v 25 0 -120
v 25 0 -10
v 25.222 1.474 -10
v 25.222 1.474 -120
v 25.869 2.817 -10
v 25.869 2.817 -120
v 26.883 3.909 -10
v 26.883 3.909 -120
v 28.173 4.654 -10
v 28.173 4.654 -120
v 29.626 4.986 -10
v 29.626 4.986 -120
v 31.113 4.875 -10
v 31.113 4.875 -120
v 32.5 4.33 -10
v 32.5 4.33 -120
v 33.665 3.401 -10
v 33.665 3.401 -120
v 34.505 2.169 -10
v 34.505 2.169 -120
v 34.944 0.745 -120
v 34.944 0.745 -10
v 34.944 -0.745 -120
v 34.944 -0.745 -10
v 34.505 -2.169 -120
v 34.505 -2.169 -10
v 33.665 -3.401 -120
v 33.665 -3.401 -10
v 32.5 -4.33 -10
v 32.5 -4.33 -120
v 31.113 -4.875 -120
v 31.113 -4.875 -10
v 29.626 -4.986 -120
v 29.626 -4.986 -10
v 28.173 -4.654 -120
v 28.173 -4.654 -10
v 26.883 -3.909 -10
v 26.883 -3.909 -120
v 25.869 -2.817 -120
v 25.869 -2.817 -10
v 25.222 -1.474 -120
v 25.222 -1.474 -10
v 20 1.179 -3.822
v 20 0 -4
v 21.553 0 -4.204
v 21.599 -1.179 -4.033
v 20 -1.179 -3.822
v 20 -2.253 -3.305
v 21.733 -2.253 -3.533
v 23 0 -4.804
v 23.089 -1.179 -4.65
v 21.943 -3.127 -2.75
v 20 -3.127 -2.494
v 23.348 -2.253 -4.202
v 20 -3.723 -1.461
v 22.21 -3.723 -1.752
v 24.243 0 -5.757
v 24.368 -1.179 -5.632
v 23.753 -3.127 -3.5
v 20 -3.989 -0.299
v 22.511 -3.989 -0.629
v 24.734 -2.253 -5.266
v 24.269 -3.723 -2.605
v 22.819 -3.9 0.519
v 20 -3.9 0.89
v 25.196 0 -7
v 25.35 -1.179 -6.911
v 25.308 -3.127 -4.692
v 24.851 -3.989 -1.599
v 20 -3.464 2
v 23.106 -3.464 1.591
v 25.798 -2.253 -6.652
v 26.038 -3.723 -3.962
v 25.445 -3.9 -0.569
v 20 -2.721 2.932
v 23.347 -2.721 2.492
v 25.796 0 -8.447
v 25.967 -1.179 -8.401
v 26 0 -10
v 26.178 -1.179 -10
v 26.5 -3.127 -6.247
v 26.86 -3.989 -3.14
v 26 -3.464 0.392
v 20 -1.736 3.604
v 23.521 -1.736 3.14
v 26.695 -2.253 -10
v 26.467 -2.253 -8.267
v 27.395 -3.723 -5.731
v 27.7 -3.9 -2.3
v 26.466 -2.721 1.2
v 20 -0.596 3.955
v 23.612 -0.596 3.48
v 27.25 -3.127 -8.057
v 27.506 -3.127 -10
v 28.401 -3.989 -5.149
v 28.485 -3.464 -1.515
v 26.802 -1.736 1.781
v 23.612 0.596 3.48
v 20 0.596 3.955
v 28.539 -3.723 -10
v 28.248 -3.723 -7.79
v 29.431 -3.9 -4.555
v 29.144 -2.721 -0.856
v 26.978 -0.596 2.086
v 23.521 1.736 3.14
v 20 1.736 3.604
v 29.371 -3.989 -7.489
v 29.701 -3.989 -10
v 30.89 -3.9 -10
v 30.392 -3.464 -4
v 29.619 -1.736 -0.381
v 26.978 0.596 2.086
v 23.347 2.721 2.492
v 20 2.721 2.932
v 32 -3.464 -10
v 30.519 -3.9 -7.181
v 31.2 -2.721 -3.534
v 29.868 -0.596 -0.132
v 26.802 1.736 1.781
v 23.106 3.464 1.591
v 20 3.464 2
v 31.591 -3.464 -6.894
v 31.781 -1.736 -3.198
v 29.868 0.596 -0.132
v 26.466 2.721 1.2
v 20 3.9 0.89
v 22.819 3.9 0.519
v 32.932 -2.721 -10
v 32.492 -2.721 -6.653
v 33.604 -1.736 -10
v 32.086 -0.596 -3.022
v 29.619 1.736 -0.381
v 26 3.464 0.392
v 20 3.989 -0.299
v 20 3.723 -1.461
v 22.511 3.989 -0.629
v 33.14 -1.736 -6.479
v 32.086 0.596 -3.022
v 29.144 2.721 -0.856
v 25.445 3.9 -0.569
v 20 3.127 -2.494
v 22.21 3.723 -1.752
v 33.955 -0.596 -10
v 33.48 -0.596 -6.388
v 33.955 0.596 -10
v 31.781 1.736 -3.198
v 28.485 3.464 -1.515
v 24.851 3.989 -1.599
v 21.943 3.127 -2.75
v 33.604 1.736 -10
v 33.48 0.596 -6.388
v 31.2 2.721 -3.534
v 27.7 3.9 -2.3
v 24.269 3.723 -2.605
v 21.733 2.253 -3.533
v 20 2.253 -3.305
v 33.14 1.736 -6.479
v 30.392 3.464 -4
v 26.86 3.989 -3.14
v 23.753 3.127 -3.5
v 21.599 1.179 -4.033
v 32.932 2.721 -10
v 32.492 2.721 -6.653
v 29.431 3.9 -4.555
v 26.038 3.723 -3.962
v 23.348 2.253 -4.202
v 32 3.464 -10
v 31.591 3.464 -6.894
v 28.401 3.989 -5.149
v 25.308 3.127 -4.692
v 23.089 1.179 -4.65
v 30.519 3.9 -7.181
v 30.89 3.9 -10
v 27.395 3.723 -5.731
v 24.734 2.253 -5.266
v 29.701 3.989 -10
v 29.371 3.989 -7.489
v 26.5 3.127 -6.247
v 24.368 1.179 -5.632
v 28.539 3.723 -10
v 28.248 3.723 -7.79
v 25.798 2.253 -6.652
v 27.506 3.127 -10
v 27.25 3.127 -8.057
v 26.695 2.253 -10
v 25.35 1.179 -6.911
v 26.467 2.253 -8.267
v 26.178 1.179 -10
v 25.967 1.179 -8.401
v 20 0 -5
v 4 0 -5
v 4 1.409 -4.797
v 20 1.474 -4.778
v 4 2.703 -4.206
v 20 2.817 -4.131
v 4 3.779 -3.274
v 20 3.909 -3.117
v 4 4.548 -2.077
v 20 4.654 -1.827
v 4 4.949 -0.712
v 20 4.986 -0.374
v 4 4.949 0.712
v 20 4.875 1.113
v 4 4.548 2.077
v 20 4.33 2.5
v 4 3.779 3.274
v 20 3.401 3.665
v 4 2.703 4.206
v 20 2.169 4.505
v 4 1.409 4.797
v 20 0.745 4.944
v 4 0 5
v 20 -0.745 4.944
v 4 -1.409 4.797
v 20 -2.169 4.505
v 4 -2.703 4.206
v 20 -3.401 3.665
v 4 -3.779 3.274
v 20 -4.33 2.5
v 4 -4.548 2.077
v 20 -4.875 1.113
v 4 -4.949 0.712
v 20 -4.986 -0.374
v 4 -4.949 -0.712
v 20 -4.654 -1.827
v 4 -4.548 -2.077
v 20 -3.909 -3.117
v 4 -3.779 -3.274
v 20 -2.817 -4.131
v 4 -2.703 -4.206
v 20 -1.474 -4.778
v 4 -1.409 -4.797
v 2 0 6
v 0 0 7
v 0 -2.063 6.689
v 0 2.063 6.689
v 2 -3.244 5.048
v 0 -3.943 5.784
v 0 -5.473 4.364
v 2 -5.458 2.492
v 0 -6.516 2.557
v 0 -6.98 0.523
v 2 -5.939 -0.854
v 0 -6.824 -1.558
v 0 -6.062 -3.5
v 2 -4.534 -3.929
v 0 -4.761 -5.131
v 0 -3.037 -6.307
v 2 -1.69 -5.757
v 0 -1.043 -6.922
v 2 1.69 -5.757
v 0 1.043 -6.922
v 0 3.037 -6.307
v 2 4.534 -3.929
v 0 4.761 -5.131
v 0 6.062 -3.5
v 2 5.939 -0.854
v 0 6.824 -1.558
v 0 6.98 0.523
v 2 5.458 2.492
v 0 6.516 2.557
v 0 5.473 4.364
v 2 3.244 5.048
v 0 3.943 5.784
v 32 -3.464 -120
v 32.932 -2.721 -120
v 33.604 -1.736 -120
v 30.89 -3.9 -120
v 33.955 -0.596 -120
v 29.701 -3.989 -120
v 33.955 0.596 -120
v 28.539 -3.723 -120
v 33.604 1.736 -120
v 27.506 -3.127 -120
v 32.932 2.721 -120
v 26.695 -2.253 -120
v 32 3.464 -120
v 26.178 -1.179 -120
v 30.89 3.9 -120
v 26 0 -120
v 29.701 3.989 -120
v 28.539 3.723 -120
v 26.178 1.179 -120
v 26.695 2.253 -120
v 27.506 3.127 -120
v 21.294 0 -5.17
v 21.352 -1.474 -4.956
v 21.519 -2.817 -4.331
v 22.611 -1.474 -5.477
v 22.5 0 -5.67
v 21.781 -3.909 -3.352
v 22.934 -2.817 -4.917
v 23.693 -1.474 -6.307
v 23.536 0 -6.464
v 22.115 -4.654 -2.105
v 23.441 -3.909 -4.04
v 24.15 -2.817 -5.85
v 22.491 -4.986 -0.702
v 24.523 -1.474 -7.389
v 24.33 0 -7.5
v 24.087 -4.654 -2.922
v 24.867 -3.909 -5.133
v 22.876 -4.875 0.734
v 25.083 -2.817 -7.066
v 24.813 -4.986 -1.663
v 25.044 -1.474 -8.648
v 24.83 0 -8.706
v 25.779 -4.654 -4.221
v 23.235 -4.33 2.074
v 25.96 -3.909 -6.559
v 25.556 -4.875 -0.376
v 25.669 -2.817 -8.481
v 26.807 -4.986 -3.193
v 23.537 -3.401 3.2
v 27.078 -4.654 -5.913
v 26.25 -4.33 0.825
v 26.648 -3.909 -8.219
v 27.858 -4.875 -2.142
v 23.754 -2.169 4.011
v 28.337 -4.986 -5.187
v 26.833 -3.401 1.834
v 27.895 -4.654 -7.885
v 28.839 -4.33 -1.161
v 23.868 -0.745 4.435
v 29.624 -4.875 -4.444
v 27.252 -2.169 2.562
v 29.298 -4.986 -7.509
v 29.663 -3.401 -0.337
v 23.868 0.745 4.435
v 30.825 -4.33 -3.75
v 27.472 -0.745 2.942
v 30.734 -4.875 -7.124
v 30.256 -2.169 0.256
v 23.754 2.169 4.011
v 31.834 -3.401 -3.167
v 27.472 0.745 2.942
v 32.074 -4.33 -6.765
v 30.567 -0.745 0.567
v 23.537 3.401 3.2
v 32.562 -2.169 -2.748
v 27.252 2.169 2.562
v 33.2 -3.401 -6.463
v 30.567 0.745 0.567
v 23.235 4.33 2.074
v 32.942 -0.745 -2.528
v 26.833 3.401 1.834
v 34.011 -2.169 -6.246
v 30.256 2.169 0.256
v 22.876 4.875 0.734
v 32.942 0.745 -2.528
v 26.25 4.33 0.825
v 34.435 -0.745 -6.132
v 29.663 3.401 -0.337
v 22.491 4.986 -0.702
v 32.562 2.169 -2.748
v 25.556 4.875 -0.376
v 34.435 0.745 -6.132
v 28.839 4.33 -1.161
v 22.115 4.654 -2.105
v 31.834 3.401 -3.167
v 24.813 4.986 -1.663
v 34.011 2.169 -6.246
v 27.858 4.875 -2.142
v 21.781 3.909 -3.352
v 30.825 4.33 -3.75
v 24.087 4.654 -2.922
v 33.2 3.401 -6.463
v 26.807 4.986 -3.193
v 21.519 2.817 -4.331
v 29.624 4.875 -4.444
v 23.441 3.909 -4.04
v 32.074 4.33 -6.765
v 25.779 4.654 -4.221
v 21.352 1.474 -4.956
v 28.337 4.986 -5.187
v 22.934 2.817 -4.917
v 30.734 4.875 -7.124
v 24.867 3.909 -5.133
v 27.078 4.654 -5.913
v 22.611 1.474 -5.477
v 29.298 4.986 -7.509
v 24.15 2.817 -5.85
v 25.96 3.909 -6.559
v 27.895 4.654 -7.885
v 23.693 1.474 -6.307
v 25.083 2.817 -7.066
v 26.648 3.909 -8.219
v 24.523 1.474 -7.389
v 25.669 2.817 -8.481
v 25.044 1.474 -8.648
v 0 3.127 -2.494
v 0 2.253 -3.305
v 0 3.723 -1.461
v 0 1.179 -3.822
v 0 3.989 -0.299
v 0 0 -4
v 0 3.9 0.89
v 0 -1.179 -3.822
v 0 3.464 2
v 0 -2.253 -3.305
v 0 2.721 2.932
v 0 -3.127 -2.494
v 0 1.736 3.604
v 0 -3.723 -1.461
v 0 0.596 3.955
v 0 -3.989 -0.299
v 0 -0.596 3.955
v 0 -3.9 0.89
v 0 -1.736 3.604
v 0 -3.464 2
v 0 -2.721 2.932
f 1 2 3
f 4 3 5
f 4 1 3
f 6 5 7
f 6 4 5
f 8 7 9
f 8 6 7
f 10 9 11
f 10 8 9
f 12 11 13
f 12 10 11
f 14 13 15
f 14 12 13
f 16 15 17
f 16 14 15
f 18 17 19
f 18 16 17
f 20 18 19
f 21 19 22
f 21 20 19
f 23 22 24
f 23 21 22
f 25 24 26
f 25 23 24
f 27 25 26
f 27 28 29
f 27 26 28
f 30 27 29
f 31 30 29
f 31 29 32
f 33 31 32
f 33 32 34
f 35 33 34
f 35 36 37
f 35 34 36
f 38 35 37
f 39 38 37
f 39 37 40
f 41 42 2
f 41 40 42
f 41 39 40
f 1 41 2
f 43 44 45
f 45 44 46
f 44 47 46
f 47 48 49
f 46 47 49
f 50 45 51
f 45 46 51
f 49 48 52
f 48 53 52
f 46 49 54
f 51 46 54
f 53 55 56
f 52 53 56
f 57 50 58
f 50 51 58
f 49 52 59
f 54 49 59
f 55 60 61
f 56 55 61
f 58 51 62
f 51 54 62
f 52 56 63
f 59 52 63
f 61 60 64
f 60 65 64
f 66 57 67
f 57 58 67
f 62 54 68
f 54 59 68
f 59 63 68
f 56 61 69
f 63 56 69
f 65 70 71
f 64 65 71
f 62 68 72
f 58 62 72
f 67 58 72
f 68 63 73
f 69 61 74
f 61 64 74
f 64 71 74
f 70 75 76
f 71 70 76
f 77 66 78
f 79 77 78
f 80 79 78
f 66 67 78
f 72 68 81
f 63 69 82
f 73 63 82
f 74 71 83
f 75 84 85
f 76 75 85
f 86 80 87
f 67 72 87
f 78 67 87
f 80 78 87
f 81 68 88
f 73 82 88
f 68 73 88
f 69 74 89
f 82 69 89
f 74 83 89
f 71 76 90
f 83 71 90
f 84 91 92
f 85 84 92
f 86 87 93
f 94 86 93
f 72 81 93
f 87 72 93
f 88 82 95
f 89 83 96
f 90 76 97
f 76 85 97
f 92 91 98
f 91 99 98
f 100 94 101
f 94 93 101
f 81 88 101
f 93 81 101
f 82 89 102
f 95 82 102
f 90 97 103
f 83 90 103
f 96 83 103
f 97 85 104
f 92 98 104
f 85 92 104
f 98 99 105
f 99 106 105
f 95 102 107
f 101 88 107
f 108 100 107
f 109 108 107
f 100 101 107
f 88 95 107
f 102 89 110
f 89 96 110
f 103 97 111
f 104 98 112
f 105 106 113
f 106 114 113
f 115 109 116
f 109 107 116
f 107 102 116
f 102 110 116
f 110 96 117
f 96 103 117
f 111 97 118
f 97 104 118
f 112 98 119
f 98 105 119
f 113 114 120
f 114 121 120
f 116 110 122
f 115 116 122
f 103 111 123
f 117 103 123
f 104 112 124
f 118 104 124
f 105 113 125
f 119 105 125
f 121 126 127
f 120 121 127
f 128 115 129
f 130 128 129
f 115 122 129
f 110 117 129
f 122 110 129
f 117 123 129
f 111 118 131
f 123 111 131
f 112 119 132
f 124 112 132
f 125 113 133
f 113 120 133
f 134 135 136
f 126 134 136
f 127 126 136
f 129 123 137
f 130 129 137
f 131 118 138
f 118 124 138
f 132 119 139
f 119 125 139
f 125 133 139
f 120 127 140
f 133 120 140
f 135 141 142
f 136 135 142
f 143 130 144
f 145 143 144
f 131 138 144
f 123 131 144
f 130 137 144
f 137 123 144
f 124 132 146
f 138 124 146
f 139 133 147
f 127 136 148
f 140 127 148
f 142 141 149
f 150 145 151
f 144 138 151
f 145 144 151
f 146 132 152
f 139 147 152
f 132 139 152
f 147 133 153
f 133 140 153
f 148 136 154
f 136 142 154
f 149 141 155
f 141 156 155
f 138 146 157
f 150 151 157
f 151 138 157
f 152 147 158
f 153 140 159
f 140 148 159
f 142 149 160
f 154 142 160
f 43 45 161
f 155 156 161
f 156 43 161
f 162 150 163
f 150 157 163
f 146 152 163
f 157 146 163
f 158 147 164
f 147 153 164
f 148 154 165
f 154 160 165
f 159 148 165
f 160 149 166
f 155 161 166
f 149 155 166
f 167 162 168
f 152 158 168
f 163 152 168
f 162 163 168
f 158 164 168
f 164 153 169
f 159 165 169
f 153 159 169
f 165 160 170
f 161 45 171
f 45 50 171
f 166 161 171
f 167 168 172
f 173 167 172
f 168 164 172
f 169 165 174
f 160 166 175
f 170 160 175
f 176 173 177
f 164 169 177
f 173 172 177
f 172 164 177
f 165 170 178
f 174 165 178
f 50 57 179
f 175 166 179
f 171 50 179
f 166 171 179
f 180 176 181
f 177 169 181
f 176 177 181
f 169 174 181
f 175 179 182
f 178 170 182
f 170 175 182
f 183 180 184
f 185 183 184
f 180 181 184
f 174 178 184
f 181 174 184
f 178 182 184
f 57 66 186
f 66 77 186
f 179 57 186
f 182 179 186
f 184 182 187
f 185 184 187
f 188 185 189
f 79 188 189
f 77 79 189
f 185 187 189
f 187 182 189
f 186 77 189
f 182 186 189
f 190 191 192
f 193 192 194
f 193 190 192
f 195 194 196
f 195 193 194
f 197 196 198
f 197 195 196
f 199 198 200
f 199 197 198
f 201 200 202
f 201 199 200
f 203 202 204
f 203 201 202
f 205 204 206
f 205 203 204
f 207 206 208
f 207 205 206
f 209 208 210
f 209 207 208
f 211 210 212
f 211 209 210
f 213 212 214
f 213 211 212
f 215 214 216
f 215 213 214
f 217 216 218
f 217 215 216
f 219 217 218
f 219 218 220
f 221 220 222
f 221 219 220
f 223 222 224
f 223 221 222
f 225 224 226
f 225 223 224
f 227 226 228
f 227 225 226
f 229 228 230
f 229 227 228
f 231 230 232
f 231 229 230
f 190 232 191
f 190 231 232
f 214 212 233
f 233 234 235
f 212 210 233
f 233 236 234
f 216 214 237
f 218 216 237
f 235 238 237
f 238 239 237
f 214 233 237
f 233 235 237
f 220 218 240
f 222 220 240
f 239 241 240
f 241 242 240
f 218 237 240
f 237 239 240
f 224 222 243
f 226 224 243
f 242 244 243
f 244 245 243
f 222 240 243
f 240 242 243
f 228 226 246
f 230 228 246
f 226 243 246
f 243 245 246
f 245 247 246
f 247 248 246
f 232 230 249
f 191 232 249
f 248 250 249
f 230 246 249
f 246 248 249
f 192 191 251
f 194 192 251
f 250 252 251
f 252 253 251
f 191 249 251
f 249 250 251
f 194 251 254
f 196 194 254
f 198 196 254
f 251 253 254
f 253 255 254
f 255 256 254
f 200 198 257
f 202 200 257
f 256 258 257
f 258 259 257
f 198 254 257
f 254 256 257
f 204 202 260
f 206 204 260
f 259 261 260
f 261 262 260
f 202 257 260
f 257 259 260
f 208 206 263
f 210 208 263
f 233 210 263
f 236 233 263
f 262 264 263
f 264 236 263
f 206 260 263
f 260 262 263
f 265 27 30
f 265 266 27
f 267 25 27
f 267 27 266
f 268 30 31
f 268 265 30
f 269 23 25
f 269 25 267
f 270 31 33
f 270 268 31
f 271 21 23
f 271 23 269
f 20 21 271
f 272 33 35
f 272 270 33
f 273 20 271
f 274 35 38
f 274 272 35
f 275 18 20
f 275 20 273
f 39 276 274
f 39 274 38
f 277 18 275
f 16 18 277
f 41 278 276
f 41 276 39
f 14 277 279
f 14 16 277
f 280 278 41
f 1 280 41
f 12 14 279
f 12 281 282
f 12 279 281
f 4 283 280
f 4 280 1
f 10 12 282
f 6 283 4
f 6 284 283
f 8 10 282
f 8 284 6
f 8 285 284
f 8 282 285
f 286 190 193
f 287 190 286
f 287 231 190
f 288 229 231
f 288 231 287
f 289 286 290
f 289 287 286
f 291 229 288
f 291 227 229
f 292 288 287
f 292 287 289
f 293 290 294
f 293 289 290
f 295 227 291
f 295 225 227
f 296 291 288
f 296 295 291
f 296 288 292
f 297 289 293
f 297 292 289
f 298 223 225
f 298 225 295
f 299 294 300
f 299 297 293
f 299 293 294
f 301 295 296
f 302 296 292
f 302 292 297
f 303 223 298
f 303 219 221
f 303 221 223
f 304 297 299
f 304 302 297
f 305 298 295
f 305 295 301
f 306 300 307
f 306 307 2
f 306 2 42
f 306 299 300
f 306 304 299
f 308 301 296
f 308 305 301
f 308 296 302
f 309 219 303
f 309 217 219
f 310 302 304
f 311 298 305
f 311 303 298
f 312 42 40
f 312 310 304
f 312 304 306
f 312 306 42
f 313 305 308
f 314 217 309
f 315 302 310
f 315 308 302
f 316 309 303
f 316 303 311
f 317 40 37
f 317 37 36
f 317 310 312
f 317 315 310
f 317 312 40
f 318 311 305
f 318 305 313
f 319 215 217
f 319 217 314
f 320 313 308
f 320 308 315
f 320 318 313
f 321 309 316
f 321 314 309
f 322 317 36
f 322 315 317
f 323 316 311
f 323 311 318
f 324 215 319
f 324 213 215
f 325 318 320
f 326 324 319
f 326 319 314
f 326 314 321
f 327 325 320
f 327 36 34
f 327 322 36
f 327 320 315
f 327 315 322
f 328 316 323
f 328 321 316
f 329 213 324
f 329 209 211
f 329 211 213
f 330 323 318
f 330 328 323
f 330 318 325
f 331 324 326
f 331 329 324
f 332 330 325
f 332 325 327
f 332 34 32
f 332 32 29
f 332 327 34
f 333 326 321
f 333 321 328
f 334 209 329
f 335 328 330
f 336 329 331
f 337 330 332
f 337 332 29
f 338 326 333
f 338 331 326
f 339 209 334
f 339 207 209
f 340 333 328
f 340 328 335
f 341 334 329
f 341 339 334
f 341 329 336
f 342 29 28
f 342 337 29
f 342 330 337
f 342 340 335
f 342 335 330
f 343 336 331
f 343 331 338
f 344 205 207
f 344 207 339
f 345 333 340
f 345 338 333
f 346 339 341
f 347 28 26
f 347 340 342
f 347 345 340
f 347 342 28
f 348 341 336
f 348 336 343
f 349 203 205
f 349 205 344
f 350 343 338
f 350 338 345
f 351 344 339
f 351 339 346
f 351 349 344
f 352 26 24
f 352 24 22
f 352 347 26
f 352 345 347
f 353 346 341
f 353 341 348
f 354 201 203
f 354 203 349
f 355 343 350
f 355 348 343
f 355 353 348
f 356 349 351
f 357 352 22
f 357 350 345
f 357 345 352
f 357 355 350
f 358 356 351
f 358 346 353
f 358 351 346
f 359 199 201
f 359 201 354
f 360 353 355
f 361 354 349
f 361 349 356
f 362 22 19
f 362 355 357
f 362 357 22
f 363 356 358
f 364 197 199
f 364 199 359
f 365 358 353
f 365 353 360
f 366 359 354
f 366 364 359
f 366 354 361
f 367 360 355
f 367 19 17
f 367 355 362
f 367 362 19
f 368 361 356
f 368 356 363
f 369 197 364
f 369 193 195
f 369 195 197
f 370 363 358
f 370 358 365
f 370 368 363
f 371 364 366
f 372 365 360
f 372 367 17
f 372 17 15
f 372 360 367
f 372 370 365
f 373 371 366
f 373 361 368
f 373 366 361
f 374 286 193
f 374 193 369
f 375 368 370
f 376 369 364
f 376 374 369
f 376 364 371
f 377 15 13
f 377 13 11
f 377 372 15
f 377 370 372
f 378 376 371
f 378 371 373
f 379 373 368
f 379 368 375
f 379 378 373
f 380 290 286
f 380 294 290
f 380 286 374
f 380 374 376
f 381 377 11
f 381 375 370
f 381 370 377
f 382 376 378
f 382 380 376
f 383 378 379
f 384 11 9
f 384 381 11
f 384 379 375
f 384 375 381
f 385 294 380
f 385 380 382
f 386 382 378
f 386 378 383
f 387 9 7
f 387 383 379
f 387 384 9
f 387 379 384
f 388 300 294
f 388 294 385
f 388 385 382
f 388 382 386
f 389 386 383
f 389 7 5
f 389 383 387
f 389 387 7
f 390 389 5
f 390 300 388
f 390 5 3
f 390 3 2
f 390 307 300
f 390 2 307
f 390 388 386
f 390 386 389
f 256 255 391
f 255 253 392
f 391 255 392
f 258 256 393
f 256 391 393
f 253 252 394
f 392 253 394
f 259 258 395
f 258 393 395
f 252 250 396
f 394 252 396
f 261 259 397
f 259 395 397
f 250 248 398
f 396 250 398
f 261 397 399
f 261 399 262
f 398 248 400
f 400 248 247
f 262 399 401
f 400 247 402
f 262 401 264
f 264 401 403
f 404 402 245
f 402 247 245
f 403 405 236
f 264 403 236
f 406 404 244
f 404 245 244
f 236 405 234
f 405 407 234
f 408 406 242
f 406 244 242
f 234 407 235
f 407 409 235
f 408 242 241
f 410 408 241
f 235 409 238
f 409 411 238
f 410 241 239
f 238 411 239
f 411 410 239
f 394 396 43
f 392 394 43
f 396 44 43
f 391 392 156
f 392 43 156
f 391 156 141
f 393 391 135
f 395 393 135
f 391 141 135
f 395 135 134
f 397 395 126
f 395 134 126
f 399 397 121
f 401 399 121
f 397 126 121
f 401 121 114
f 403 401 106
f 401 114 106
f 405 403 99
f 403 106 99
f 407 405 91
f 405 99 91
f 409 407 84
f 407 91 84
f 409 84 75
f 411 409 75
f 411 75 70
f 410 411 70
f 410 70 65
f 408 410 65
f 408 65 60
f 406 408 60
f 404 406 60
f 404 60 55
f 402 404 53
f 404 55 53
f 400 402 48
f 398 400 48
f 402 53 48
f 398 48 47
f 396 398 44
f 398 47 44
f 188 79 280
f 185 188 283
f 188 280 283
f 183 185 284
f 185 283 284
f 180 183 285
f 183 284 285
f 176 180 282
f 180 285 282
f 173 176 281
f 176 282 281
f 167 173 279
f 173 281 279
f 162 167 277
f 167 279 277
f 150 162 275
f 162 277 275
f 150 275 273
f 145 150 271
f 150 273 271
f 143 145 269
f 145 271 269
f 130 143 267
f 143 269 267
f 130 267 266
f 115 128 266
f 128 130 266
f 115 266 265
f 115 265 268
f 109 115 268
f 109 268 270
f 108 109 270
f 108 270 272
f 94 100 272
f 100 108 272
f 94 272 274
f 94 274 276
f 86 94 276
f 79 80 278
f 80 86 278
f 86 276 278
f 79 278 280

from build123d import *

# Parameters (mm, degrees)
SKETCH_2_R   = 5
SKETCH_2_R_2 = 4


with BuildPart() as part:
    # По траектории1: sweep along a path in Эскиз1
    with BuildLine(Plane(origin=(0, 0, 0), x_dir=(1, 0, 0), z_dir=(0, 1, 0))) as sweep_1_path:
        Line((0, 0), (20, 0))
        ThreePointArc((20, 0), (27.071067812, 2.928932188), (30, 10))
        Line((30, 10), (30, 120))
    # Эскиз2 → По траектории1 (sweep)
    with BuildSketch(Plane(origin=(0, 0, 0), x_dir=(0, 0, -1), z_dir=(1, 0, 0))):
        Circle(SKETCH_2_R)
        Circle(SKETCH_2_R_2, mode=Mode.SUBTRACT)
    sweep(path=sweep_1_path.line)

    # Эскиз3 → Повернуть1 (revolve)
    with BuildSketch(Plane.XY, mode=Mode.PRIVATE) as revolve_1_sk:
        Polygon((0, 7), (0, 4), (4, 4), (4, 5), align=None)
    revolve(revolve_1_sk.sketch.rotate(Axis((-3.453428096, 0, 0), (1, 0, 0)), 90), axis=Axis((-3.453428096, 0, 0), (1, 0, 0)))


solid = part.part
